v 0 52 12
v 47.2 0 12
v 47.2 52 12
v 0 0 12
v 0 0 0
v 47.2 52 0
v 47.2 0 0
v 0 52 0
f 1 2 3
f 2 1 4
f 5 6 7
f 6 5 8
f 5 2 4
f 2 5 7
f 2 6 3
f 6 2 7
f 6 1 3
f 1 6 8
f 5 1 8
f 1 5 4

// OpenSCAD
module batteriesHolder4AAA() {
    color("red")
        cube([
            47.2,
            52,
            12
        ]);
}


batteriesHolder4AAA();
